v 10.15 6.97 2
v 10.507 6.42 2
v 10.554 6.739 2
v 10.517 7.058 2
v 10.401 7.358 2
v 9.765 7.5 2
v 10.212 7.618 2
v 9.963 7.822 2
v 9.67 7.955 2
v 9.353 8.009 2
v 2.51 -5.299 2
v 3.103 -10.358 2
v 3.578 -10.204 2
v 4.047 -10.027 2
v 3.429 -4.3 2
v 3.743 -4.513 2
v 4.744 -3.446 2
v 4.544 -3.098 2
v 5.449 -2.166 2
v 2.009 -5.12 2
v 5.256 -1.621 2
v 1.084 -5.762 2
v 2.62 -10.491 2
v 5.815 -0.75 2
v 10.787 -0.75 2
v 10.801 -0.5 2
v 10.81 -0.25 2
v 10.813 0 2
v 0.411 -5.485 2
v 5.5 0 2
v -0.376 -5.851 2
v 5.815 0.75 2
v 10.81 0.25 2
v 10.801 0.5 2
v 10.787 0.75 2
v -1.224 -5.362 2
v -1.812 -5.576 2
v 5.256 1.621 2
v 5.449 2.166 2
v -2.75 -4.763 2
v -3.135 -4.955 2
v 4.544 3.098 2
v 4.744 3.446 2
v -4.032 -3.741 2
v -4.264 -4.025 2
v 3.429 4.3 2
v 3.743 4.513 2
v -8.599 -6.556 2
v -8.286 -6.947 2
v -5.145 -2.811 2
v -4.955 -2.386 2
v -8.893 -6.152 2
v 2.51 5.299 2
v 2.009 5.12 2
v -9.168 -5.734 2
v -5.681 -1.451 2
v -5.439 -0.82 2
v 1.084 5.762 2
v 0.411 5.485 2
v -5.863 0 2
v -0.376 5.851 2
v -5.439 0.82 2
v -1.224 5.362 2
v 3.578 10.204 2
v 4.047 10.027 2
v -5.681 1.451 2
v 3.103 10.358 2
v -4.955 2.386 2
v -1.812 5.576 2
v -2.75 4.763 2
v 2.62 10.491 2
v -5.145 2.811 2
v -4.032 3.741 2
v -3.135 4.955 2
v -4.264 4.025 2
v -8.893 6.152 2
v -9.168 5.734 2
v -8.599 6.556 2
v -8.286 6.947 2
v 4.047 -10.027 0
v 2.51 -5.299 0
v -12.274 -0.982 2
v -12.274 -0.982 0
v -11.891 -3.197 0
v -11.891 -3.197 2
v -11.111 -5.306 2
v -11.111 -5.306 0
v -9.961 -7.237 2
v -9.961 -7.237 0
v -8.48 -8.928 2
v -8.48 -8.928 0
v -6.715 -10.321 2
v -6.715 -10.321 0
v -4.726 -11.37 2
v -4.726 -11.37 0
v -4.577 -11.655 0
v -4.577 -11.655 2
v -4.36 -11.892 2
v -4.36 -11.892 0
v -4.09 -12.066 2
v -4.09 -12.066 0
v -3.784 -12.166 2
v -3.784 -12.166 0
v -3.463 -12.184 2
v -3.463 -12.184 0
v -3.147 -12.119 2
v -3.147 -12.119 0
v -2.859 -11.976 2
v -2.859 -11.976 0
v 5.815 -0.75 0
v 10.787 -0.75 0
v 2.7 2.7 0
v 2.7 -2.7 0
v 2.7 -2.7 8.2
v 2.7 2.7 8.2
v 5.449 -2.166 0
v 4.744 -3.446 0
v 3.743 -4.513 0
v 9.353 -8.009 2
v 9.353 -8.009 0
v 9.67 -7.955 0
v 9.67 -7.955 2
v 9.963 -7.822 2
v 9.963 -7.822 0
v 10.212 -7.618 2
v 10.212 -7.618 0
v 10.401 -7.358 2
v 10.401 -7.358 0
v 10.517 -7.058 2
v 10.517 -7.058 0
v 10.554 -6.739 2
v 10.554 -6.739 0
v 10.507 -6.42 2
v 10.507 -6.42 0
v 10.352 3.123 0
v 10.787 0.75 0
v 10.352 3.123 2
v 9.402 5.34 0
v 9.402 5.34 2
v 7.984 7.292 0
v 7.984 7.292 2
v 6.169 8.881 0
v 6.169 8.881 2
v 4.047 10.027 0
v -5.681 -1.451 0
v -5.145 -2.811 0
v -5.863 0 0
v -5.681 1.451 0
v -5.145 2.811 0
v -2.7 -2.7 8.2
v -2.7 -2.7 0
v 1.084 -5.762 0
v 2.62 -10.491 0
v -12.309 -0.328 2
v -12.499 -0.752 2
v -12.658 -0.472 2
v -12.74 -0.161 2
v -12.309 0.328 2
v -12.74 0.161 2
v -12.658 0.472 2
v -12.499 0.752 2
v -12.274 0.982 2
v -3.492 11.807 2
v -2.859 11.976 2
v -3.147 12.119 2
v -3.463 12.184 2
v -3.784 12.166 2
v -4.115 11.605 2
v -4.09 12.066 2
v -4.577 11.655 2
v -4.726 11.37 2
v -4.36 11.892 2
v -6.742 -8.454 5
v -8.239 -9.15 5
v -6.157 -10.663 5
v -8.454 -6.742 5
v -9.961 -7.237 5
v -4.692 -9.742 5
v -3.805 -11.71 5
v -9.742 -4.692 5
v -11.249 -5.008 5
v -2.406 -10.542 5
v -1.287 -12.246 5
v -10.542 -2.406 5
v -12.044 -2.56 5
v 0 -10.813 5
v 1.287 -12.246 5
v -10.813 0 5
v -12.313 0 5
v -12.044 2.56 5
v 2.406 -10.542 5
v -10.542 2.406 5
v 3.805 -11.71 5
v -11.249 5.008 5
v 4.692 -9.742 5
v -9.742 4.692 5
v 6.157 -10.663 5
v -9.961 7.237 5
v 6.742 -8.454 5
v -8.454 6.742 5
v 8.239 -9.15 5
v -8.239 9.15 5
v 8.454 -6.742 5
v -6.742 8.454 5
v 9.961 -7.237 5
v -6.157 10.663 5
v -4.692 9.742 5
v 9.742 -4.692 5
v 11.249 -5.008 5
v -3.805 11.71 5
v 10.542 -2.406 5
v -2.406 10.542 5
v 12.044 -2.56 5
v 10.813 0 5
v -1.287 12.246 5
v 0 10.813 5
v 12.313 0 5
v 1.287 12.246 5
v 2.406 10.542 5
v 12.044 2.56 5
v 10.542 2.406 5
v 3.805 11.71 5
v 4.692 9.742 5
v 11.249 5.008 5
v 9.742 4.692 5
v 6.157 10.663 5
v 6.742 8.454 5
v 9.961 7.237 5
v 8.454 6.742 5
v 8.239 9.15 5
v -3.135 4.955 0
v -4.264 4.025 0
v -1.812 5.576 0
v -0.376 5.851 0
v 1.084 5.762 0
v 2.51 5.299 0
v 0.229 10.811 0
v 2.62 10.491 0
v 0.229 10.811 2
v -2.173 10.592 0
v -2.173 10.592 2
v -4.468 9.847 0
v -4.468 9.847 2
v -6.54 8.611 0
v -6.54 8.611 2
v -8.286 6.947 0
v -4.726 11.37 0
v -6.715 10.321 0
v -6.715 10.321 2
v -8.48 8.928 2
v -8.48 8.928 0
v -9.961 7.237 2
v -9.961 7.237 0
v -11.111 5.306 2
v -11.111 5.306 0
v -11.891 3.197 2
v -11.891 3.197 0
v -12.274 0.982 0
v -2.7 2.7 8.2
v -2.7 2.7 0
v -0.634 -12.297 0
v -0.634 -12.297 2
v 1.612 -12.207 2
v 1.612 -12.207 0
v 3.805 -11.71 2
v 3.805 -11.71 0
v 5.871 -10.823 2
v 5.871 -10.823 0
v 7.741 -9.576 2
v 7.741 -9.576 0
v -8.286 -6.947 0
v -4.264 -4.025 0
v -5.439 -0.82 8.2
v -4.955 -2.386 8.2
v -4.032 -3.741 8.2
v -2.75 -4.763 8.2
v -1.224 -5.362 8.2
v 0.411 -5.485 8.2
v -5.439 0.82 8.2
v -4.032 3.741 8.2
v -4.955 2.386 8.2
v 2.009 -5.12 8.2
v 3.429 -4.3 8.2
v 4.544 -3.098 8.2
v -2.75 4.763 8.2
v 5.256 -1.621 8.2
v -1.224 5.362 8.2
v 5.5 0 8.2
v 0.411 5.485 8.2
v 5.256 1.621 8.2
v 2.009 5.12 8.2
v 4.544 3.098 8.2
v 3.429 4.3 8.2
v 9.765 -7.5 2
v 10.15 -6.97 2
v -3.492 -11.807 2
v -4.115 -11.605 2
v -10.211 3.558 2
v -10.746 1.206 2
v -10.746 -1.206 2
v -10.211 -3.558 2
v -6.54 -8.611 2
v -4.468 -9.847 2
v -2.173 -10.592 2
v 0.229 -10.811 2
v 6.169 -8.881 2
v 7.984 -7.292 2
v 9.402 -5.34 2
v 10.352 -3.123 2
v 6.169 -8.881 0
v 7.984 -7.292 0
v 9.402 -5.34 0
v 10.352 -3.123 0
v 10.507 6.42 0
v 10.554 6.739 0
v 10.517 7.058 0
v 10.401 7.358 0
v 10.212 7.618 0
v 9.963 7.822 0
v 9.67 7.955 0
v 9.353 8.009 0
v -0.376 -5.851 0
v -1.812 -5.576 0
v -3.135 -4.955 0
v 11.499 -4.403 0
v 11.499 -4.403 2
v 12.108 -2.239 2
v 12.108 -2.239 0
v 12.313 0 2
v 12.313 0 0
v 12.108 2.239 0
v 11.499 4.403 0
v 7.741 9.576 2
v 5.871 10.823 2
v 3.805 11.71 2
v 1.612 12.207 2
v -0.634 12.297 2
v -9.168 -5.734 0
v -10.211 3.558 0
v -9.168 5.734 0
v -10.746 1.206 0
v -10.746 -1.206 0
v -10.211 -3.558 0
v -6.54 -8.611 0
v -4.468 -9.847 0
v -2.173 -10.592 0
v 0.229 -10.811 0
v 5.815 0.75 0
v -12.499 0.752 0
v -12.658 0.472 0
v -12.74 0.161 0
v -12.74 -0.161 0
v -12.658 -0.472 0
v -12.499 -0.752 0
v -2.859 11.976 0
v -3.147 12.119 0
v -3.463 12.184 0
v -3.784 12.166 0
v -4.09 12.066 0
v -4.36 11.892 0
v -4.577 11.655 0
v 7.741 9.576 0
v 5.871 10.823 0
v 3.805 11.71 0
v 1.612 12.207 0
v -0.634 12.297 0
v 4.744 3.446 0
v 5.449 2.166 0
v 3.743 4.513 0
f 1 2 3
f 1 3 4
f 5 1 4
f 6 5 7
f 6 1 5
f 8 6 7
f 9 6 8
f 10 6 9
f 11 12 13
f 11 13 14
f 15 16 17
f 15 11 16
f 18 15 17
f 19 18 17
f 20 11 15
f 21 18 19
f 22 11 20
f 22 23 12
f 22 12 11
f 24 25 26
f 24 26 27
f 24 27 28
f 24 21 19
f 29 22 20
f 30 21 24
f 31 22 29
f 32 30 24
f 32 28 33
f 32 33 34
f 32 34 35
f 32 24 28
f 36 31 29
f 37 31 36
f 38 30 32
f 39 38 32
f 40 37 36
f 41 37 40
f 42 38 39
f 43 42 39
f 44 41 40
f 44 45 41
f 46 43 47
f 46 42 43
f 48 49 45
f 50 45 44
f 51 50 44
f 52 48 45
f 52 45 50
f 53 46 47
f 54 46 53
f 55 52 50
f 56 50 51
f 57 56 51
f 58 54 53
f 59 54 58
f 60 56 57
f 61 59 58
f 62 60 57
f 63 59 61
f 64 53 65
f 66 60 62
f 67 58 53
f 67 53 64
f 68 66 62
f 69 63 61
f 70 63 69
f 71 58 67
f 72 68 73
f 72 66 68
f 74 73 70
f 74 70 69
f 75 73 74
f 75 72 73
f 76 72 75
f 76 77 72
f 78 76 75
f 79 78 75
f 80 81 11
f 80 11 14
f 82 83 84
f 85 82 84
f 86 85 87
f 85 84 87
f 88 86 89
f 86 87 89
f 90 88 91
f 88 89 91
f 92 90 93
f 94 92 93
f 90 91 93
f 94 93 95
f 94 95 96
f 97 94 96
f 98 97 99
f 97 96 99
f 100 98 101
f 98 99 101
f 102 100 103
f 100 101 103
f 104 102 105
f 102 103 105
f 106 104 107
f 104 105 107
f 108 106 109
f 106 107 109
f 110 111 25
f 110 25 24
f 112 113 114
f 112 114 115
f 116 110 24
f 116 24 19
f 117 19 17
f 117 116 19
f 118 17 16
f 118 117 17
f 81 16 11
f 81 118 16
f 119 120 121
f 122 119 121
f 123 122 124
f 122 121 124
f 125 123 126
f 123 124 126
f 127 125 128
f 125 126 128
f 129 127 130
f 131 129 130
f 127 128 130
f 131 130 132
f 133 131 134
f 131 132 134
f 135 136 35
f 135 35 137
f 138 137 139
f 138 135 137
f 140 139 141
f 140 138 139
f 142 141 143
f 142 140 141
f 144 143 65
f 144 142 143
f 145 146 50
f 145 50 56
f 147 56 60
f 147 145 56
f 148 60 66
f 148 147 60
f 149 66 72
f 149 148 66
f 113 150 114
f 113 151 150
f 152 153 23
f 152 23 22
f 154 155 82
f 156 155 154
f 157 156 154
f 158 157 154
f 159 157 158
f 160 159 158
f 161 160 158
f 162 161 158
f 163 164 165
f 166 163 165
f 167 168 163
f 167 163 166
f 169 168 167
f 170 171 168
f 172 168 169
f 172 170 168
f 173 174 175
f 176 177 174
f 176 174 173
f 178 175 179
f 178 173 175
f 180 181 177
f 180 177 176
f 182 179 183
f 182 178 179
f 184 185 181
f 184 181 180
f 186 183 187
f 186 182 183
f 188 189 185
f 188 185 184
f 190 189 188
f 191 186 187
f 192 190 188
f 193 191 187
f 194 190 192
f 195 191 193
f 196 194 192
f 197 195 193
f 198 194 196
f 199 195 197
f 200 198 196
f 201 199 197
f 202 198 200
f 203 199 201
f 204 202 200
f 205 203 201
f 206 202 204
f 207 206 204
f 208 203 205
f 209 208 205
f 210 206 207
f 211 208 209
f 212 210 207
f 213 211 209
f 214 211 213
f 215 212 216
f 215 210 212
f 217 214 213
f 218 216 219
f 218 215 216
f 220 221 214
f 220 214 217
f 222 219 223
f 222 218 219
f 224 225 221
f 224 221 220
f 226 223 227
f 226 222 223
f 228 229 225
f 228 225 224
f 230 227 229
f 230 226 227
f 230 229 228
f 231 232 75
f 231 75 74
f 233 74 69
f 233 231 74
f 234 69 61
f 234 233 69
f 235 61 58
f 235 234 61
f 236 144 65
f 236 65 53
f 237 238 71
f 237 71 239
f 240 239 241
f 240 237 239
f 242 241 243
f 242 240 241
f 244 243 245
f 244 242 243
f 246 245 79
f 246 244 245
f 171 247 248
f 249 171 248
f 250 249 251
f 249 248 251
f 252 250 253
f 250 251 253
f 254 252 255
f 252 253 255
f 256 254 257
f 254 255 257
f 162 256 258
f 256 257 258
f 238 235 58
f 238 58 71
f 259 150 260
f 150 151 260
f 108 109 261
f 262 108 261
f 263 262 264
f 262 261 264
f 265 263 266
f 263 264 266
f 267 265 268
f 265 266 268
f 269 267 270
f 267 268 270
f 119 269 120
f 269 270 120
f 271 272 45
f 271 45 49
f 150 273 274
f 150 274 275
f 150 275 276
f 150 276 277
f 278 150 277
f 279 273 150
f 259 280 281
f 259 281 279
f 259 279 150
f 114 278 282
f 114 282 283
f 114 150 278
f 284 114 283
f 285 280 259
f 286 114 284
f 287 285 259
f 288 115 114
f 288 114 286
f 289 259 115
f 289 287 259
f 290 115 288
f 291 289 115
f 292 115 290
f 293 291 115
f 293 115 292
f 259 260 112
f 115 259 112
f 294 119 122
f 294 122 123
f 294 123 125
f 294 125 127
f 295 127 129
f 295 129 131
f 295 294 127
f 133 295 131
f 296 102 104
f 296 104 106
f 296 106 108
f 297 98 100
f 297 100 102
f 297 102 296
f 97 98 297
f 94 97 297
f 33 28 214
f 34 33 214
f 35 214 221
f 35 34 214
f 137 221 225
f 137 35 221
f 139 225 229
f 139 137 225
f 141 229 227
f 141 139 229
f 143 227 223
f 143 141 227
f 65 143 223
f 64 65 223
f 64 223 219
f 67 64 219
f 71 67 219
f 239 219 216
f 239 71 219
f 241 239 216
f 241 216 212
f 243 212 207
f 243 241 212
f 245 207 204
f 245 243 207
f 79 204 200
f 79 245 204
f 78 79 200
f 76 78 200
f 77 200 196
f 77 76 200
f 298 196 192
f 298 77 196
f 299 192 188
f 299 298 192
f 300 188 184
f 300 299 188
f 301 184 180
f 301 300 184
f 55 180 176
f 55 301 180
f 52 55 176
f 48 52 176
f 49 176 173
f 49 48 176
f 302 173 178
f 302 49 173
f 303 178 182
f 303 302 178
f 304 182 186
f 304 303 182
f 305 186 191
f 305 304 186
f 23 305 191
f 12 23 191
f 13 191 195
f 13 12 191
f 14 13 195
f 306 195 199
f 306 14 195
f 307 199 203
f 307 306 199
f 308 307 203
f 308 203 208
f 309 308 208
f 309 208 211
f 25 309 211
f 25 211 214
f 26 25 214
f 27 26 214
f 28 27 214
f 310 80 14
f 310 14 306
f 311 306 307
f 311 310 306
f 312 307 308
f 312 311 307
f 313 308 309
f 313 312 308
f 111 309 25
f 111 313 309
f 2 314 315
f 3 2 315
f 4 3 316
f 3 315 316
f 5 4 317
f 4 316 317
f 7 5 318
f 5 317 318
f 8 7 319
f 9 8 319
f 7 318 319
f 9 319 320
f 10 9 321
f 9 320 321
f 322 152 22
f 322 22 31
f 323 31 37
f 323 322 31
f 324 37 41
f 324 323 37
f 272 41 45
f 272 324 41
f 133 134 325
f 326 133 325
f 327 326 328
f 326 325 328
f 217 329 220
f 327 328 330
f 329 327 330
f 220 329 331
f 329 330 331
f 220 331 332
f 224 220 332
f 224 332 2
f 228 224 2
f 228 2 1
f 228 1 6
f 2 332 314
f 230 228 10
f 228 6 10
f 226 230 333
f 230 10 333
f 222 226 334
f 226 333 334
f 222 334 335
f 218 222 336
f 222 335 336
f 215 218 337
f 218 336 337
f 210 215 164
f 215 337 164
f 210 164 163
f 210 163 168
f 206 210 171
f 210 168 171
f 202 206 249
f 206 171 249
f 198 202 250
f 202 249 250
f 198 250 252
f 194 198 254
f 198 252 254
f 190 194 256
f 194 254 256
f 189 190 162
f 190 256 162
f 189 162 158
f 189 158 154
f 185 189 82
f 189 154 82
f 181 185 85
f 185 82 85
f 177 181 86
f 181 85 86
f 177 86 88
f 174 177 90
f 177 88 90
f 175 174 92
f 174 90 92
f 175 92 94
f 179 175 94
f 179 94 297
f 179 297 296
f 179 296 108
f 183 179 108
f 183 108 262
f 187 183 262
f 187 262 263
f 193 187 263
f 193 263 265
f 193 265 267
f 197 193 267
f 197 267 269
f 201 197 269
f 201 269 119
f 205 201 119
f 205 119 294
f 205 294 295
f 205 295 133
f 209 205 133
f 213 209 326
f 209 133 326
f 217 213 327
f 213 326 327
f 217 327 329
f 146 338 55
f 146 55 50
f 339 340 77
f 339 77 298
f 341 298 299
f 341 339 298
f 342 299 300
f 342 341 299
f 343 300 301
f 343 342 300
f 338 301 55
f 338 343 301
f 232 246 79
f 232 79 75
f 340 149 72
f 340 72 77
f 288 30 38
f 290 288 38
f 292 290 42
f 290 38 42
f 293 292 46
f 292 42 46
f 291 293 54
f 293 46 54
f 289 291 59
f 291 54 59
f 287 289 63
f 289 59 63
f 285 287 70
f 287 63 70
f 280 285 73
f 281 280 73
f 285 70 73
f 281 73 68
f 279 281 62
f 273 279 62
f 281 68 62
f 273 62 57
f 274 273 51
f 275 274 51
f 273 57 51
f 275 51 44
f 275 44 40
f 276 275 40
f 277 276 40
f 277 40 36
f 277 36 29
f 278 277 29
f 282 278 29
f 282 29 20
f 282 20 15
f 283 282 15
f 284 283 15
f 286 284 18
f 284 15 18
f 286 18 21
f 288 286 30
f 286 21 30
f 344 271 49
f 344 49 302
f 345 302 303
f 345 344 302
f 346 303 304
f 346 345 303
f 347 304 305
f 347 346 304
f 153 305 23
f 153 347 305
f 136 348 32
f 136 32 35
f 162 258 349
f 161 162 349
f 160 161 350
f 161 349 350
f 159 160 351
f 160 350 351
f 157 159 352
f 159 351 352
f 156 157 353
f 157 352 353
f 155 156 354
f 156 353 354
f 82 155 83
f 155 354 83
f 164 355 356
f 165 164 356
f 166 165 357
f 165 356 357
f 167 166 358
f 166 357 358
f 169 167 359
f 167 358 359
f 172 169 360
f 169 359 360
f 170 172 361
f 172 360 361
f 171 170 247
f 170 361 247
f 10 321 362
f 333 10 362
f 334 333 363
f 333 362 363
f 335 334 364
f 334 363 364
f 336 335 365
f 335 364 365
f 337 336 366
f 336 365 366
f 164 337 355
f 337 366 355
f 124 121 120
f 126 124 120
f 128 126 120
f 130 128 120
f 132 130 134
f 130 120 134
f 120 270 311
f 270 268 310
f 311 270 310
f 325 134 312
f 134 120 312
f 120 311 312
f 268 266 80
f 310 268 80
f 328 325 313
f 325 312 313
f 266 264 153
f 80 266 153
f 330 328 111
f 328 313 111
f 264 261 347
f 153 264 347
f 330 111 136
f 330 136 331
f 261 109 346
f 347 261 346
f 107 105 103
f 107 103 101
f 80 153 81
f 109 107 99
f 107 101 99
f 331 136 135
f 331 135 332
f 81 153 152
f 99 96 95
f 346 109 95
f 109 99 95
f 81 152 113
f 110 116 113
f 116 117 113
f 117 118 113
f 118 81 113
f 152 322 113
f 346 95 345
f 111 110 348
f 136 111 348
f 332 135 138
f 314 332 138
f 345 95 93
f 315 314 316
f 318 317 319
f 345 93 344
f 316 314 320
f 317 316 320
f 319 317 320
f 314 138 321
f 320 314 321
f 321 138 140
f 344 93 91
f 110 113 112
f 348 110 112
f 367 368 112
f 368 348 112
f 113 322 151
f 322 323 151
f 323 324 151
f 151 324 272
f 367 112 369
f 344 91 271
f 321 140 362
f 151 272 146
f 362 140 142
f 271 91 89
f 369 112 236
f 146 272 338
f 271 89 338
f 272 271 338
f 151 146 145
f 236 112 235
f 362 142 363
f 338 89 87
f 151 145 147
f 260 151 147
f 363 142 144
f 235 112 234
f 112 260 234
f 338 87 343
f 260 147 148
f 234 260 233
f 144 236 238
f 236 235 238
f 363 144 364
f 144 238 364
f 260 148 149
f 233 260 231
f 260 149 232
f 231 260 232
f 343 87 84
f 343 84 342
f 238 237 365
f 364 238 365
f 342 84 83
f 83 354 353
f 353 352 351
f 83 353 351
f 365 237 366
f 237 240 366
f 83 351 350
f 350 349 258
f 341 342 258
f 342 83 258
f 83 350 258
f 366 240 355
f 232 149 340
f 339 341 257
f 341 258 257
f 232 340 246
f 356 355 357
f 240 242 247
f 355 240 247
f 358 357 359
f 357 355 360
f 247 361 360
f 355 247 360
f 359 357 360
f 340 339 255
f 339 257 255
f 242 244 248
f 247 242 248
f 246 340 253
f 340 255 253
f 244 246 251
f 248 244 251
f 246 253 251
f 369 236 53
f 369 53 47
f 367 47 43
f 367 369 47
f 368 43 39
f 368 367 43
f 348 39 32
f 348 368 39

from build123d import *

# Parameters (mm, degrees)
SKETCH_1_W      = 5.4
SKETCH_1_H      = 5.4
EXTRUDE_1_DEPTH = 2
SKETCH_2_R      = 12.313072817
SKETCH_2_R_2    = 10.813072817
EXTRUDE_2_DEPTH = 3
SKETCH_3_R      = 5.5
SKETCH_3_W      = 5.4
SKETCH_3_H      = 5.4
EXTRUDE_3_DEPTH = 6.2


with BuildPart() as part:
    # 스케치1 → 보스-돌출1 (new body)
    with BuildSketch(Plane(origin=(0, 0, 0), x_dir=(0, 1, 0), z_dir=(0, 0, 1))):
        with BuildLine():
            ThreePointArc((0.981635498, 12.273880965), (0, 12.75), (-0.981635498, 12.273880965))
            ThreePointArc((-0.981635498, 12.273880965), (-7.237442612, 9.961485162), (-11.369812421, 4.726428642))
            ThreePointArc((-11.369812421, 4.726428642), (-12.125970583, 3.939966678), (-11.976496524, 2.859246968))
            ThreePointArc((-11.976496524, 2.859246968), (-11.710428139, -3.804948754), (-8.00856602, -9.352787419))
            ThreePointArc((-8.00856602, -9.352787419), (-7.494261967, -10.314966678), (-6.42024642, -10.506769157))
            ThreePointArc((-6.42024642, -10.506769157), (0, -12.313072817), (6.42024642, -10.506769157))
            ThreePointArc((6.42024642, -10.506769157), (7.494261967, -10.314966678), (8.00856602, -9.352787419))
            ThreePointArc((8.00856602, -9.352787419), (11.710428139, -3.804948754), (11.976496524, 2.859246968))
            ThreePointArc((11.976496524, 2.859246968), (12.125970583, 3.939966678), (11.369812421, 4.726428642))
            ThreePointArc((11.369812421, 4.726428642), (7.237442612, 9.961485162), (0.981635498, 12.273880965))
        make_face()
        with BuildLine():
            ThreePointArc((5.733695154, 9.167730561), (0, 10.813072817), (-5.733695154, 9.167730561))
            Line((-5.733695154, 9.167730561), (-2.811327739, 5.145436885))
            ThreePointArc((-2.811327739, 5.145436885), (0, 5.863368008), (2.811327739, 5.145436885))
            Line((2.811327739, 5.145436885), (5.733695154, 9.167730561))
        make_face(mode=Mode.SUBTRACT)
        with BuildLine():
            ThreePointArc((10.490839132, -2.620083596), (10.283843364, 3.341423262), (6.947220646, 8.286052682))
            Line((6.947220646, 8.286052682), (4.024853231, 4.263759007))
            ThreePointArc((4.024853231, 4.263759007), (5.576394352, 1.811880359), (5.762349327, -1.083704125))
            Line((5.762349327, -1.083704125), (10.490839132, -2.620083596))
        make_face(mode=Mode.SUBTRACT)
        Rectangle(SKETCH_1_W, SKETCH_1_H, mode=Mode.SUBTRACT)
        with BuildLine():
            Line((-5.298823836, -2.510288899), (-10.027313641, -4.04666837))
            ThreePointArc((-10.027313641, -4.04666837), (-6.355764734, -8.747959671), (-0.75, -10.787031276))
            Line((-0.75, -10.787031276), (-0.75, -5.815202868))
            ThreePointArc((-0.75, -5.815202868), (-3.446401244, -4.743564363), (-5.298823836, -2.510288899))
        make_face(mode=Mode.SUBTRACT)
        with BuildLine():
            Line((-4.024853231, 4.263759007), (-6.947220646, 8.286052682))
            ThreePointArc((-6.947220646, 8.286052682), (-10.283843364, 3.341423262), (-10.490839132, -2.620083596))
            Line((-10.490839132, -2.620083596), (-5.762349327, -1.083704125))
            ThreePointArc((-5.762349327, -1.083704125), (-5.576394352, 1.811880359), (-4.024853231, 4.263759007))
        make_face(mode=Mode.SUBTRACT)
        with BuildLine():
            Line((0.75, -5.815202868), (0.75, -10.787031276))
            ThreePointArc((0.75, -10.787031276), (6.355764734, -8.747959671), (10.027313641, -4.04666837))
            Line((10.027313641, -4.04666837), (5.298823836, -2.510288899))
            ThreePointArc((5.298823836, -2.510288899), (3.446401244, -4.743564363), (0.75, -5.815202868))
        make_face(mode=Mode.SUBTRACT)
    extrude(amount=EXTRUDE_1_DEPTH)

    # 스케치2 → 보스-돌출2 (add)
    with BuildSketch(Plane.XY.offset(2)):
        Circle(SKETCH_2_R)
        Circle(SKETCH_2_R_2, mode=Mode.SUBTRACT)
    extrude(amount=EXTRUDE_2_DEPTH)

    # 스케치3 → 보스-돌출3 (add)
    with BuildSketch(Plane.XY.offset(2)):
        Circle(SKETCH_3_R)
        Rectangle(SKETCH_3_W, SKETCH_3_H, mode=Mode.SUBTRACT)
    extrude(amount=EXTRUDE_3_DEPTH)


solid = part.part
